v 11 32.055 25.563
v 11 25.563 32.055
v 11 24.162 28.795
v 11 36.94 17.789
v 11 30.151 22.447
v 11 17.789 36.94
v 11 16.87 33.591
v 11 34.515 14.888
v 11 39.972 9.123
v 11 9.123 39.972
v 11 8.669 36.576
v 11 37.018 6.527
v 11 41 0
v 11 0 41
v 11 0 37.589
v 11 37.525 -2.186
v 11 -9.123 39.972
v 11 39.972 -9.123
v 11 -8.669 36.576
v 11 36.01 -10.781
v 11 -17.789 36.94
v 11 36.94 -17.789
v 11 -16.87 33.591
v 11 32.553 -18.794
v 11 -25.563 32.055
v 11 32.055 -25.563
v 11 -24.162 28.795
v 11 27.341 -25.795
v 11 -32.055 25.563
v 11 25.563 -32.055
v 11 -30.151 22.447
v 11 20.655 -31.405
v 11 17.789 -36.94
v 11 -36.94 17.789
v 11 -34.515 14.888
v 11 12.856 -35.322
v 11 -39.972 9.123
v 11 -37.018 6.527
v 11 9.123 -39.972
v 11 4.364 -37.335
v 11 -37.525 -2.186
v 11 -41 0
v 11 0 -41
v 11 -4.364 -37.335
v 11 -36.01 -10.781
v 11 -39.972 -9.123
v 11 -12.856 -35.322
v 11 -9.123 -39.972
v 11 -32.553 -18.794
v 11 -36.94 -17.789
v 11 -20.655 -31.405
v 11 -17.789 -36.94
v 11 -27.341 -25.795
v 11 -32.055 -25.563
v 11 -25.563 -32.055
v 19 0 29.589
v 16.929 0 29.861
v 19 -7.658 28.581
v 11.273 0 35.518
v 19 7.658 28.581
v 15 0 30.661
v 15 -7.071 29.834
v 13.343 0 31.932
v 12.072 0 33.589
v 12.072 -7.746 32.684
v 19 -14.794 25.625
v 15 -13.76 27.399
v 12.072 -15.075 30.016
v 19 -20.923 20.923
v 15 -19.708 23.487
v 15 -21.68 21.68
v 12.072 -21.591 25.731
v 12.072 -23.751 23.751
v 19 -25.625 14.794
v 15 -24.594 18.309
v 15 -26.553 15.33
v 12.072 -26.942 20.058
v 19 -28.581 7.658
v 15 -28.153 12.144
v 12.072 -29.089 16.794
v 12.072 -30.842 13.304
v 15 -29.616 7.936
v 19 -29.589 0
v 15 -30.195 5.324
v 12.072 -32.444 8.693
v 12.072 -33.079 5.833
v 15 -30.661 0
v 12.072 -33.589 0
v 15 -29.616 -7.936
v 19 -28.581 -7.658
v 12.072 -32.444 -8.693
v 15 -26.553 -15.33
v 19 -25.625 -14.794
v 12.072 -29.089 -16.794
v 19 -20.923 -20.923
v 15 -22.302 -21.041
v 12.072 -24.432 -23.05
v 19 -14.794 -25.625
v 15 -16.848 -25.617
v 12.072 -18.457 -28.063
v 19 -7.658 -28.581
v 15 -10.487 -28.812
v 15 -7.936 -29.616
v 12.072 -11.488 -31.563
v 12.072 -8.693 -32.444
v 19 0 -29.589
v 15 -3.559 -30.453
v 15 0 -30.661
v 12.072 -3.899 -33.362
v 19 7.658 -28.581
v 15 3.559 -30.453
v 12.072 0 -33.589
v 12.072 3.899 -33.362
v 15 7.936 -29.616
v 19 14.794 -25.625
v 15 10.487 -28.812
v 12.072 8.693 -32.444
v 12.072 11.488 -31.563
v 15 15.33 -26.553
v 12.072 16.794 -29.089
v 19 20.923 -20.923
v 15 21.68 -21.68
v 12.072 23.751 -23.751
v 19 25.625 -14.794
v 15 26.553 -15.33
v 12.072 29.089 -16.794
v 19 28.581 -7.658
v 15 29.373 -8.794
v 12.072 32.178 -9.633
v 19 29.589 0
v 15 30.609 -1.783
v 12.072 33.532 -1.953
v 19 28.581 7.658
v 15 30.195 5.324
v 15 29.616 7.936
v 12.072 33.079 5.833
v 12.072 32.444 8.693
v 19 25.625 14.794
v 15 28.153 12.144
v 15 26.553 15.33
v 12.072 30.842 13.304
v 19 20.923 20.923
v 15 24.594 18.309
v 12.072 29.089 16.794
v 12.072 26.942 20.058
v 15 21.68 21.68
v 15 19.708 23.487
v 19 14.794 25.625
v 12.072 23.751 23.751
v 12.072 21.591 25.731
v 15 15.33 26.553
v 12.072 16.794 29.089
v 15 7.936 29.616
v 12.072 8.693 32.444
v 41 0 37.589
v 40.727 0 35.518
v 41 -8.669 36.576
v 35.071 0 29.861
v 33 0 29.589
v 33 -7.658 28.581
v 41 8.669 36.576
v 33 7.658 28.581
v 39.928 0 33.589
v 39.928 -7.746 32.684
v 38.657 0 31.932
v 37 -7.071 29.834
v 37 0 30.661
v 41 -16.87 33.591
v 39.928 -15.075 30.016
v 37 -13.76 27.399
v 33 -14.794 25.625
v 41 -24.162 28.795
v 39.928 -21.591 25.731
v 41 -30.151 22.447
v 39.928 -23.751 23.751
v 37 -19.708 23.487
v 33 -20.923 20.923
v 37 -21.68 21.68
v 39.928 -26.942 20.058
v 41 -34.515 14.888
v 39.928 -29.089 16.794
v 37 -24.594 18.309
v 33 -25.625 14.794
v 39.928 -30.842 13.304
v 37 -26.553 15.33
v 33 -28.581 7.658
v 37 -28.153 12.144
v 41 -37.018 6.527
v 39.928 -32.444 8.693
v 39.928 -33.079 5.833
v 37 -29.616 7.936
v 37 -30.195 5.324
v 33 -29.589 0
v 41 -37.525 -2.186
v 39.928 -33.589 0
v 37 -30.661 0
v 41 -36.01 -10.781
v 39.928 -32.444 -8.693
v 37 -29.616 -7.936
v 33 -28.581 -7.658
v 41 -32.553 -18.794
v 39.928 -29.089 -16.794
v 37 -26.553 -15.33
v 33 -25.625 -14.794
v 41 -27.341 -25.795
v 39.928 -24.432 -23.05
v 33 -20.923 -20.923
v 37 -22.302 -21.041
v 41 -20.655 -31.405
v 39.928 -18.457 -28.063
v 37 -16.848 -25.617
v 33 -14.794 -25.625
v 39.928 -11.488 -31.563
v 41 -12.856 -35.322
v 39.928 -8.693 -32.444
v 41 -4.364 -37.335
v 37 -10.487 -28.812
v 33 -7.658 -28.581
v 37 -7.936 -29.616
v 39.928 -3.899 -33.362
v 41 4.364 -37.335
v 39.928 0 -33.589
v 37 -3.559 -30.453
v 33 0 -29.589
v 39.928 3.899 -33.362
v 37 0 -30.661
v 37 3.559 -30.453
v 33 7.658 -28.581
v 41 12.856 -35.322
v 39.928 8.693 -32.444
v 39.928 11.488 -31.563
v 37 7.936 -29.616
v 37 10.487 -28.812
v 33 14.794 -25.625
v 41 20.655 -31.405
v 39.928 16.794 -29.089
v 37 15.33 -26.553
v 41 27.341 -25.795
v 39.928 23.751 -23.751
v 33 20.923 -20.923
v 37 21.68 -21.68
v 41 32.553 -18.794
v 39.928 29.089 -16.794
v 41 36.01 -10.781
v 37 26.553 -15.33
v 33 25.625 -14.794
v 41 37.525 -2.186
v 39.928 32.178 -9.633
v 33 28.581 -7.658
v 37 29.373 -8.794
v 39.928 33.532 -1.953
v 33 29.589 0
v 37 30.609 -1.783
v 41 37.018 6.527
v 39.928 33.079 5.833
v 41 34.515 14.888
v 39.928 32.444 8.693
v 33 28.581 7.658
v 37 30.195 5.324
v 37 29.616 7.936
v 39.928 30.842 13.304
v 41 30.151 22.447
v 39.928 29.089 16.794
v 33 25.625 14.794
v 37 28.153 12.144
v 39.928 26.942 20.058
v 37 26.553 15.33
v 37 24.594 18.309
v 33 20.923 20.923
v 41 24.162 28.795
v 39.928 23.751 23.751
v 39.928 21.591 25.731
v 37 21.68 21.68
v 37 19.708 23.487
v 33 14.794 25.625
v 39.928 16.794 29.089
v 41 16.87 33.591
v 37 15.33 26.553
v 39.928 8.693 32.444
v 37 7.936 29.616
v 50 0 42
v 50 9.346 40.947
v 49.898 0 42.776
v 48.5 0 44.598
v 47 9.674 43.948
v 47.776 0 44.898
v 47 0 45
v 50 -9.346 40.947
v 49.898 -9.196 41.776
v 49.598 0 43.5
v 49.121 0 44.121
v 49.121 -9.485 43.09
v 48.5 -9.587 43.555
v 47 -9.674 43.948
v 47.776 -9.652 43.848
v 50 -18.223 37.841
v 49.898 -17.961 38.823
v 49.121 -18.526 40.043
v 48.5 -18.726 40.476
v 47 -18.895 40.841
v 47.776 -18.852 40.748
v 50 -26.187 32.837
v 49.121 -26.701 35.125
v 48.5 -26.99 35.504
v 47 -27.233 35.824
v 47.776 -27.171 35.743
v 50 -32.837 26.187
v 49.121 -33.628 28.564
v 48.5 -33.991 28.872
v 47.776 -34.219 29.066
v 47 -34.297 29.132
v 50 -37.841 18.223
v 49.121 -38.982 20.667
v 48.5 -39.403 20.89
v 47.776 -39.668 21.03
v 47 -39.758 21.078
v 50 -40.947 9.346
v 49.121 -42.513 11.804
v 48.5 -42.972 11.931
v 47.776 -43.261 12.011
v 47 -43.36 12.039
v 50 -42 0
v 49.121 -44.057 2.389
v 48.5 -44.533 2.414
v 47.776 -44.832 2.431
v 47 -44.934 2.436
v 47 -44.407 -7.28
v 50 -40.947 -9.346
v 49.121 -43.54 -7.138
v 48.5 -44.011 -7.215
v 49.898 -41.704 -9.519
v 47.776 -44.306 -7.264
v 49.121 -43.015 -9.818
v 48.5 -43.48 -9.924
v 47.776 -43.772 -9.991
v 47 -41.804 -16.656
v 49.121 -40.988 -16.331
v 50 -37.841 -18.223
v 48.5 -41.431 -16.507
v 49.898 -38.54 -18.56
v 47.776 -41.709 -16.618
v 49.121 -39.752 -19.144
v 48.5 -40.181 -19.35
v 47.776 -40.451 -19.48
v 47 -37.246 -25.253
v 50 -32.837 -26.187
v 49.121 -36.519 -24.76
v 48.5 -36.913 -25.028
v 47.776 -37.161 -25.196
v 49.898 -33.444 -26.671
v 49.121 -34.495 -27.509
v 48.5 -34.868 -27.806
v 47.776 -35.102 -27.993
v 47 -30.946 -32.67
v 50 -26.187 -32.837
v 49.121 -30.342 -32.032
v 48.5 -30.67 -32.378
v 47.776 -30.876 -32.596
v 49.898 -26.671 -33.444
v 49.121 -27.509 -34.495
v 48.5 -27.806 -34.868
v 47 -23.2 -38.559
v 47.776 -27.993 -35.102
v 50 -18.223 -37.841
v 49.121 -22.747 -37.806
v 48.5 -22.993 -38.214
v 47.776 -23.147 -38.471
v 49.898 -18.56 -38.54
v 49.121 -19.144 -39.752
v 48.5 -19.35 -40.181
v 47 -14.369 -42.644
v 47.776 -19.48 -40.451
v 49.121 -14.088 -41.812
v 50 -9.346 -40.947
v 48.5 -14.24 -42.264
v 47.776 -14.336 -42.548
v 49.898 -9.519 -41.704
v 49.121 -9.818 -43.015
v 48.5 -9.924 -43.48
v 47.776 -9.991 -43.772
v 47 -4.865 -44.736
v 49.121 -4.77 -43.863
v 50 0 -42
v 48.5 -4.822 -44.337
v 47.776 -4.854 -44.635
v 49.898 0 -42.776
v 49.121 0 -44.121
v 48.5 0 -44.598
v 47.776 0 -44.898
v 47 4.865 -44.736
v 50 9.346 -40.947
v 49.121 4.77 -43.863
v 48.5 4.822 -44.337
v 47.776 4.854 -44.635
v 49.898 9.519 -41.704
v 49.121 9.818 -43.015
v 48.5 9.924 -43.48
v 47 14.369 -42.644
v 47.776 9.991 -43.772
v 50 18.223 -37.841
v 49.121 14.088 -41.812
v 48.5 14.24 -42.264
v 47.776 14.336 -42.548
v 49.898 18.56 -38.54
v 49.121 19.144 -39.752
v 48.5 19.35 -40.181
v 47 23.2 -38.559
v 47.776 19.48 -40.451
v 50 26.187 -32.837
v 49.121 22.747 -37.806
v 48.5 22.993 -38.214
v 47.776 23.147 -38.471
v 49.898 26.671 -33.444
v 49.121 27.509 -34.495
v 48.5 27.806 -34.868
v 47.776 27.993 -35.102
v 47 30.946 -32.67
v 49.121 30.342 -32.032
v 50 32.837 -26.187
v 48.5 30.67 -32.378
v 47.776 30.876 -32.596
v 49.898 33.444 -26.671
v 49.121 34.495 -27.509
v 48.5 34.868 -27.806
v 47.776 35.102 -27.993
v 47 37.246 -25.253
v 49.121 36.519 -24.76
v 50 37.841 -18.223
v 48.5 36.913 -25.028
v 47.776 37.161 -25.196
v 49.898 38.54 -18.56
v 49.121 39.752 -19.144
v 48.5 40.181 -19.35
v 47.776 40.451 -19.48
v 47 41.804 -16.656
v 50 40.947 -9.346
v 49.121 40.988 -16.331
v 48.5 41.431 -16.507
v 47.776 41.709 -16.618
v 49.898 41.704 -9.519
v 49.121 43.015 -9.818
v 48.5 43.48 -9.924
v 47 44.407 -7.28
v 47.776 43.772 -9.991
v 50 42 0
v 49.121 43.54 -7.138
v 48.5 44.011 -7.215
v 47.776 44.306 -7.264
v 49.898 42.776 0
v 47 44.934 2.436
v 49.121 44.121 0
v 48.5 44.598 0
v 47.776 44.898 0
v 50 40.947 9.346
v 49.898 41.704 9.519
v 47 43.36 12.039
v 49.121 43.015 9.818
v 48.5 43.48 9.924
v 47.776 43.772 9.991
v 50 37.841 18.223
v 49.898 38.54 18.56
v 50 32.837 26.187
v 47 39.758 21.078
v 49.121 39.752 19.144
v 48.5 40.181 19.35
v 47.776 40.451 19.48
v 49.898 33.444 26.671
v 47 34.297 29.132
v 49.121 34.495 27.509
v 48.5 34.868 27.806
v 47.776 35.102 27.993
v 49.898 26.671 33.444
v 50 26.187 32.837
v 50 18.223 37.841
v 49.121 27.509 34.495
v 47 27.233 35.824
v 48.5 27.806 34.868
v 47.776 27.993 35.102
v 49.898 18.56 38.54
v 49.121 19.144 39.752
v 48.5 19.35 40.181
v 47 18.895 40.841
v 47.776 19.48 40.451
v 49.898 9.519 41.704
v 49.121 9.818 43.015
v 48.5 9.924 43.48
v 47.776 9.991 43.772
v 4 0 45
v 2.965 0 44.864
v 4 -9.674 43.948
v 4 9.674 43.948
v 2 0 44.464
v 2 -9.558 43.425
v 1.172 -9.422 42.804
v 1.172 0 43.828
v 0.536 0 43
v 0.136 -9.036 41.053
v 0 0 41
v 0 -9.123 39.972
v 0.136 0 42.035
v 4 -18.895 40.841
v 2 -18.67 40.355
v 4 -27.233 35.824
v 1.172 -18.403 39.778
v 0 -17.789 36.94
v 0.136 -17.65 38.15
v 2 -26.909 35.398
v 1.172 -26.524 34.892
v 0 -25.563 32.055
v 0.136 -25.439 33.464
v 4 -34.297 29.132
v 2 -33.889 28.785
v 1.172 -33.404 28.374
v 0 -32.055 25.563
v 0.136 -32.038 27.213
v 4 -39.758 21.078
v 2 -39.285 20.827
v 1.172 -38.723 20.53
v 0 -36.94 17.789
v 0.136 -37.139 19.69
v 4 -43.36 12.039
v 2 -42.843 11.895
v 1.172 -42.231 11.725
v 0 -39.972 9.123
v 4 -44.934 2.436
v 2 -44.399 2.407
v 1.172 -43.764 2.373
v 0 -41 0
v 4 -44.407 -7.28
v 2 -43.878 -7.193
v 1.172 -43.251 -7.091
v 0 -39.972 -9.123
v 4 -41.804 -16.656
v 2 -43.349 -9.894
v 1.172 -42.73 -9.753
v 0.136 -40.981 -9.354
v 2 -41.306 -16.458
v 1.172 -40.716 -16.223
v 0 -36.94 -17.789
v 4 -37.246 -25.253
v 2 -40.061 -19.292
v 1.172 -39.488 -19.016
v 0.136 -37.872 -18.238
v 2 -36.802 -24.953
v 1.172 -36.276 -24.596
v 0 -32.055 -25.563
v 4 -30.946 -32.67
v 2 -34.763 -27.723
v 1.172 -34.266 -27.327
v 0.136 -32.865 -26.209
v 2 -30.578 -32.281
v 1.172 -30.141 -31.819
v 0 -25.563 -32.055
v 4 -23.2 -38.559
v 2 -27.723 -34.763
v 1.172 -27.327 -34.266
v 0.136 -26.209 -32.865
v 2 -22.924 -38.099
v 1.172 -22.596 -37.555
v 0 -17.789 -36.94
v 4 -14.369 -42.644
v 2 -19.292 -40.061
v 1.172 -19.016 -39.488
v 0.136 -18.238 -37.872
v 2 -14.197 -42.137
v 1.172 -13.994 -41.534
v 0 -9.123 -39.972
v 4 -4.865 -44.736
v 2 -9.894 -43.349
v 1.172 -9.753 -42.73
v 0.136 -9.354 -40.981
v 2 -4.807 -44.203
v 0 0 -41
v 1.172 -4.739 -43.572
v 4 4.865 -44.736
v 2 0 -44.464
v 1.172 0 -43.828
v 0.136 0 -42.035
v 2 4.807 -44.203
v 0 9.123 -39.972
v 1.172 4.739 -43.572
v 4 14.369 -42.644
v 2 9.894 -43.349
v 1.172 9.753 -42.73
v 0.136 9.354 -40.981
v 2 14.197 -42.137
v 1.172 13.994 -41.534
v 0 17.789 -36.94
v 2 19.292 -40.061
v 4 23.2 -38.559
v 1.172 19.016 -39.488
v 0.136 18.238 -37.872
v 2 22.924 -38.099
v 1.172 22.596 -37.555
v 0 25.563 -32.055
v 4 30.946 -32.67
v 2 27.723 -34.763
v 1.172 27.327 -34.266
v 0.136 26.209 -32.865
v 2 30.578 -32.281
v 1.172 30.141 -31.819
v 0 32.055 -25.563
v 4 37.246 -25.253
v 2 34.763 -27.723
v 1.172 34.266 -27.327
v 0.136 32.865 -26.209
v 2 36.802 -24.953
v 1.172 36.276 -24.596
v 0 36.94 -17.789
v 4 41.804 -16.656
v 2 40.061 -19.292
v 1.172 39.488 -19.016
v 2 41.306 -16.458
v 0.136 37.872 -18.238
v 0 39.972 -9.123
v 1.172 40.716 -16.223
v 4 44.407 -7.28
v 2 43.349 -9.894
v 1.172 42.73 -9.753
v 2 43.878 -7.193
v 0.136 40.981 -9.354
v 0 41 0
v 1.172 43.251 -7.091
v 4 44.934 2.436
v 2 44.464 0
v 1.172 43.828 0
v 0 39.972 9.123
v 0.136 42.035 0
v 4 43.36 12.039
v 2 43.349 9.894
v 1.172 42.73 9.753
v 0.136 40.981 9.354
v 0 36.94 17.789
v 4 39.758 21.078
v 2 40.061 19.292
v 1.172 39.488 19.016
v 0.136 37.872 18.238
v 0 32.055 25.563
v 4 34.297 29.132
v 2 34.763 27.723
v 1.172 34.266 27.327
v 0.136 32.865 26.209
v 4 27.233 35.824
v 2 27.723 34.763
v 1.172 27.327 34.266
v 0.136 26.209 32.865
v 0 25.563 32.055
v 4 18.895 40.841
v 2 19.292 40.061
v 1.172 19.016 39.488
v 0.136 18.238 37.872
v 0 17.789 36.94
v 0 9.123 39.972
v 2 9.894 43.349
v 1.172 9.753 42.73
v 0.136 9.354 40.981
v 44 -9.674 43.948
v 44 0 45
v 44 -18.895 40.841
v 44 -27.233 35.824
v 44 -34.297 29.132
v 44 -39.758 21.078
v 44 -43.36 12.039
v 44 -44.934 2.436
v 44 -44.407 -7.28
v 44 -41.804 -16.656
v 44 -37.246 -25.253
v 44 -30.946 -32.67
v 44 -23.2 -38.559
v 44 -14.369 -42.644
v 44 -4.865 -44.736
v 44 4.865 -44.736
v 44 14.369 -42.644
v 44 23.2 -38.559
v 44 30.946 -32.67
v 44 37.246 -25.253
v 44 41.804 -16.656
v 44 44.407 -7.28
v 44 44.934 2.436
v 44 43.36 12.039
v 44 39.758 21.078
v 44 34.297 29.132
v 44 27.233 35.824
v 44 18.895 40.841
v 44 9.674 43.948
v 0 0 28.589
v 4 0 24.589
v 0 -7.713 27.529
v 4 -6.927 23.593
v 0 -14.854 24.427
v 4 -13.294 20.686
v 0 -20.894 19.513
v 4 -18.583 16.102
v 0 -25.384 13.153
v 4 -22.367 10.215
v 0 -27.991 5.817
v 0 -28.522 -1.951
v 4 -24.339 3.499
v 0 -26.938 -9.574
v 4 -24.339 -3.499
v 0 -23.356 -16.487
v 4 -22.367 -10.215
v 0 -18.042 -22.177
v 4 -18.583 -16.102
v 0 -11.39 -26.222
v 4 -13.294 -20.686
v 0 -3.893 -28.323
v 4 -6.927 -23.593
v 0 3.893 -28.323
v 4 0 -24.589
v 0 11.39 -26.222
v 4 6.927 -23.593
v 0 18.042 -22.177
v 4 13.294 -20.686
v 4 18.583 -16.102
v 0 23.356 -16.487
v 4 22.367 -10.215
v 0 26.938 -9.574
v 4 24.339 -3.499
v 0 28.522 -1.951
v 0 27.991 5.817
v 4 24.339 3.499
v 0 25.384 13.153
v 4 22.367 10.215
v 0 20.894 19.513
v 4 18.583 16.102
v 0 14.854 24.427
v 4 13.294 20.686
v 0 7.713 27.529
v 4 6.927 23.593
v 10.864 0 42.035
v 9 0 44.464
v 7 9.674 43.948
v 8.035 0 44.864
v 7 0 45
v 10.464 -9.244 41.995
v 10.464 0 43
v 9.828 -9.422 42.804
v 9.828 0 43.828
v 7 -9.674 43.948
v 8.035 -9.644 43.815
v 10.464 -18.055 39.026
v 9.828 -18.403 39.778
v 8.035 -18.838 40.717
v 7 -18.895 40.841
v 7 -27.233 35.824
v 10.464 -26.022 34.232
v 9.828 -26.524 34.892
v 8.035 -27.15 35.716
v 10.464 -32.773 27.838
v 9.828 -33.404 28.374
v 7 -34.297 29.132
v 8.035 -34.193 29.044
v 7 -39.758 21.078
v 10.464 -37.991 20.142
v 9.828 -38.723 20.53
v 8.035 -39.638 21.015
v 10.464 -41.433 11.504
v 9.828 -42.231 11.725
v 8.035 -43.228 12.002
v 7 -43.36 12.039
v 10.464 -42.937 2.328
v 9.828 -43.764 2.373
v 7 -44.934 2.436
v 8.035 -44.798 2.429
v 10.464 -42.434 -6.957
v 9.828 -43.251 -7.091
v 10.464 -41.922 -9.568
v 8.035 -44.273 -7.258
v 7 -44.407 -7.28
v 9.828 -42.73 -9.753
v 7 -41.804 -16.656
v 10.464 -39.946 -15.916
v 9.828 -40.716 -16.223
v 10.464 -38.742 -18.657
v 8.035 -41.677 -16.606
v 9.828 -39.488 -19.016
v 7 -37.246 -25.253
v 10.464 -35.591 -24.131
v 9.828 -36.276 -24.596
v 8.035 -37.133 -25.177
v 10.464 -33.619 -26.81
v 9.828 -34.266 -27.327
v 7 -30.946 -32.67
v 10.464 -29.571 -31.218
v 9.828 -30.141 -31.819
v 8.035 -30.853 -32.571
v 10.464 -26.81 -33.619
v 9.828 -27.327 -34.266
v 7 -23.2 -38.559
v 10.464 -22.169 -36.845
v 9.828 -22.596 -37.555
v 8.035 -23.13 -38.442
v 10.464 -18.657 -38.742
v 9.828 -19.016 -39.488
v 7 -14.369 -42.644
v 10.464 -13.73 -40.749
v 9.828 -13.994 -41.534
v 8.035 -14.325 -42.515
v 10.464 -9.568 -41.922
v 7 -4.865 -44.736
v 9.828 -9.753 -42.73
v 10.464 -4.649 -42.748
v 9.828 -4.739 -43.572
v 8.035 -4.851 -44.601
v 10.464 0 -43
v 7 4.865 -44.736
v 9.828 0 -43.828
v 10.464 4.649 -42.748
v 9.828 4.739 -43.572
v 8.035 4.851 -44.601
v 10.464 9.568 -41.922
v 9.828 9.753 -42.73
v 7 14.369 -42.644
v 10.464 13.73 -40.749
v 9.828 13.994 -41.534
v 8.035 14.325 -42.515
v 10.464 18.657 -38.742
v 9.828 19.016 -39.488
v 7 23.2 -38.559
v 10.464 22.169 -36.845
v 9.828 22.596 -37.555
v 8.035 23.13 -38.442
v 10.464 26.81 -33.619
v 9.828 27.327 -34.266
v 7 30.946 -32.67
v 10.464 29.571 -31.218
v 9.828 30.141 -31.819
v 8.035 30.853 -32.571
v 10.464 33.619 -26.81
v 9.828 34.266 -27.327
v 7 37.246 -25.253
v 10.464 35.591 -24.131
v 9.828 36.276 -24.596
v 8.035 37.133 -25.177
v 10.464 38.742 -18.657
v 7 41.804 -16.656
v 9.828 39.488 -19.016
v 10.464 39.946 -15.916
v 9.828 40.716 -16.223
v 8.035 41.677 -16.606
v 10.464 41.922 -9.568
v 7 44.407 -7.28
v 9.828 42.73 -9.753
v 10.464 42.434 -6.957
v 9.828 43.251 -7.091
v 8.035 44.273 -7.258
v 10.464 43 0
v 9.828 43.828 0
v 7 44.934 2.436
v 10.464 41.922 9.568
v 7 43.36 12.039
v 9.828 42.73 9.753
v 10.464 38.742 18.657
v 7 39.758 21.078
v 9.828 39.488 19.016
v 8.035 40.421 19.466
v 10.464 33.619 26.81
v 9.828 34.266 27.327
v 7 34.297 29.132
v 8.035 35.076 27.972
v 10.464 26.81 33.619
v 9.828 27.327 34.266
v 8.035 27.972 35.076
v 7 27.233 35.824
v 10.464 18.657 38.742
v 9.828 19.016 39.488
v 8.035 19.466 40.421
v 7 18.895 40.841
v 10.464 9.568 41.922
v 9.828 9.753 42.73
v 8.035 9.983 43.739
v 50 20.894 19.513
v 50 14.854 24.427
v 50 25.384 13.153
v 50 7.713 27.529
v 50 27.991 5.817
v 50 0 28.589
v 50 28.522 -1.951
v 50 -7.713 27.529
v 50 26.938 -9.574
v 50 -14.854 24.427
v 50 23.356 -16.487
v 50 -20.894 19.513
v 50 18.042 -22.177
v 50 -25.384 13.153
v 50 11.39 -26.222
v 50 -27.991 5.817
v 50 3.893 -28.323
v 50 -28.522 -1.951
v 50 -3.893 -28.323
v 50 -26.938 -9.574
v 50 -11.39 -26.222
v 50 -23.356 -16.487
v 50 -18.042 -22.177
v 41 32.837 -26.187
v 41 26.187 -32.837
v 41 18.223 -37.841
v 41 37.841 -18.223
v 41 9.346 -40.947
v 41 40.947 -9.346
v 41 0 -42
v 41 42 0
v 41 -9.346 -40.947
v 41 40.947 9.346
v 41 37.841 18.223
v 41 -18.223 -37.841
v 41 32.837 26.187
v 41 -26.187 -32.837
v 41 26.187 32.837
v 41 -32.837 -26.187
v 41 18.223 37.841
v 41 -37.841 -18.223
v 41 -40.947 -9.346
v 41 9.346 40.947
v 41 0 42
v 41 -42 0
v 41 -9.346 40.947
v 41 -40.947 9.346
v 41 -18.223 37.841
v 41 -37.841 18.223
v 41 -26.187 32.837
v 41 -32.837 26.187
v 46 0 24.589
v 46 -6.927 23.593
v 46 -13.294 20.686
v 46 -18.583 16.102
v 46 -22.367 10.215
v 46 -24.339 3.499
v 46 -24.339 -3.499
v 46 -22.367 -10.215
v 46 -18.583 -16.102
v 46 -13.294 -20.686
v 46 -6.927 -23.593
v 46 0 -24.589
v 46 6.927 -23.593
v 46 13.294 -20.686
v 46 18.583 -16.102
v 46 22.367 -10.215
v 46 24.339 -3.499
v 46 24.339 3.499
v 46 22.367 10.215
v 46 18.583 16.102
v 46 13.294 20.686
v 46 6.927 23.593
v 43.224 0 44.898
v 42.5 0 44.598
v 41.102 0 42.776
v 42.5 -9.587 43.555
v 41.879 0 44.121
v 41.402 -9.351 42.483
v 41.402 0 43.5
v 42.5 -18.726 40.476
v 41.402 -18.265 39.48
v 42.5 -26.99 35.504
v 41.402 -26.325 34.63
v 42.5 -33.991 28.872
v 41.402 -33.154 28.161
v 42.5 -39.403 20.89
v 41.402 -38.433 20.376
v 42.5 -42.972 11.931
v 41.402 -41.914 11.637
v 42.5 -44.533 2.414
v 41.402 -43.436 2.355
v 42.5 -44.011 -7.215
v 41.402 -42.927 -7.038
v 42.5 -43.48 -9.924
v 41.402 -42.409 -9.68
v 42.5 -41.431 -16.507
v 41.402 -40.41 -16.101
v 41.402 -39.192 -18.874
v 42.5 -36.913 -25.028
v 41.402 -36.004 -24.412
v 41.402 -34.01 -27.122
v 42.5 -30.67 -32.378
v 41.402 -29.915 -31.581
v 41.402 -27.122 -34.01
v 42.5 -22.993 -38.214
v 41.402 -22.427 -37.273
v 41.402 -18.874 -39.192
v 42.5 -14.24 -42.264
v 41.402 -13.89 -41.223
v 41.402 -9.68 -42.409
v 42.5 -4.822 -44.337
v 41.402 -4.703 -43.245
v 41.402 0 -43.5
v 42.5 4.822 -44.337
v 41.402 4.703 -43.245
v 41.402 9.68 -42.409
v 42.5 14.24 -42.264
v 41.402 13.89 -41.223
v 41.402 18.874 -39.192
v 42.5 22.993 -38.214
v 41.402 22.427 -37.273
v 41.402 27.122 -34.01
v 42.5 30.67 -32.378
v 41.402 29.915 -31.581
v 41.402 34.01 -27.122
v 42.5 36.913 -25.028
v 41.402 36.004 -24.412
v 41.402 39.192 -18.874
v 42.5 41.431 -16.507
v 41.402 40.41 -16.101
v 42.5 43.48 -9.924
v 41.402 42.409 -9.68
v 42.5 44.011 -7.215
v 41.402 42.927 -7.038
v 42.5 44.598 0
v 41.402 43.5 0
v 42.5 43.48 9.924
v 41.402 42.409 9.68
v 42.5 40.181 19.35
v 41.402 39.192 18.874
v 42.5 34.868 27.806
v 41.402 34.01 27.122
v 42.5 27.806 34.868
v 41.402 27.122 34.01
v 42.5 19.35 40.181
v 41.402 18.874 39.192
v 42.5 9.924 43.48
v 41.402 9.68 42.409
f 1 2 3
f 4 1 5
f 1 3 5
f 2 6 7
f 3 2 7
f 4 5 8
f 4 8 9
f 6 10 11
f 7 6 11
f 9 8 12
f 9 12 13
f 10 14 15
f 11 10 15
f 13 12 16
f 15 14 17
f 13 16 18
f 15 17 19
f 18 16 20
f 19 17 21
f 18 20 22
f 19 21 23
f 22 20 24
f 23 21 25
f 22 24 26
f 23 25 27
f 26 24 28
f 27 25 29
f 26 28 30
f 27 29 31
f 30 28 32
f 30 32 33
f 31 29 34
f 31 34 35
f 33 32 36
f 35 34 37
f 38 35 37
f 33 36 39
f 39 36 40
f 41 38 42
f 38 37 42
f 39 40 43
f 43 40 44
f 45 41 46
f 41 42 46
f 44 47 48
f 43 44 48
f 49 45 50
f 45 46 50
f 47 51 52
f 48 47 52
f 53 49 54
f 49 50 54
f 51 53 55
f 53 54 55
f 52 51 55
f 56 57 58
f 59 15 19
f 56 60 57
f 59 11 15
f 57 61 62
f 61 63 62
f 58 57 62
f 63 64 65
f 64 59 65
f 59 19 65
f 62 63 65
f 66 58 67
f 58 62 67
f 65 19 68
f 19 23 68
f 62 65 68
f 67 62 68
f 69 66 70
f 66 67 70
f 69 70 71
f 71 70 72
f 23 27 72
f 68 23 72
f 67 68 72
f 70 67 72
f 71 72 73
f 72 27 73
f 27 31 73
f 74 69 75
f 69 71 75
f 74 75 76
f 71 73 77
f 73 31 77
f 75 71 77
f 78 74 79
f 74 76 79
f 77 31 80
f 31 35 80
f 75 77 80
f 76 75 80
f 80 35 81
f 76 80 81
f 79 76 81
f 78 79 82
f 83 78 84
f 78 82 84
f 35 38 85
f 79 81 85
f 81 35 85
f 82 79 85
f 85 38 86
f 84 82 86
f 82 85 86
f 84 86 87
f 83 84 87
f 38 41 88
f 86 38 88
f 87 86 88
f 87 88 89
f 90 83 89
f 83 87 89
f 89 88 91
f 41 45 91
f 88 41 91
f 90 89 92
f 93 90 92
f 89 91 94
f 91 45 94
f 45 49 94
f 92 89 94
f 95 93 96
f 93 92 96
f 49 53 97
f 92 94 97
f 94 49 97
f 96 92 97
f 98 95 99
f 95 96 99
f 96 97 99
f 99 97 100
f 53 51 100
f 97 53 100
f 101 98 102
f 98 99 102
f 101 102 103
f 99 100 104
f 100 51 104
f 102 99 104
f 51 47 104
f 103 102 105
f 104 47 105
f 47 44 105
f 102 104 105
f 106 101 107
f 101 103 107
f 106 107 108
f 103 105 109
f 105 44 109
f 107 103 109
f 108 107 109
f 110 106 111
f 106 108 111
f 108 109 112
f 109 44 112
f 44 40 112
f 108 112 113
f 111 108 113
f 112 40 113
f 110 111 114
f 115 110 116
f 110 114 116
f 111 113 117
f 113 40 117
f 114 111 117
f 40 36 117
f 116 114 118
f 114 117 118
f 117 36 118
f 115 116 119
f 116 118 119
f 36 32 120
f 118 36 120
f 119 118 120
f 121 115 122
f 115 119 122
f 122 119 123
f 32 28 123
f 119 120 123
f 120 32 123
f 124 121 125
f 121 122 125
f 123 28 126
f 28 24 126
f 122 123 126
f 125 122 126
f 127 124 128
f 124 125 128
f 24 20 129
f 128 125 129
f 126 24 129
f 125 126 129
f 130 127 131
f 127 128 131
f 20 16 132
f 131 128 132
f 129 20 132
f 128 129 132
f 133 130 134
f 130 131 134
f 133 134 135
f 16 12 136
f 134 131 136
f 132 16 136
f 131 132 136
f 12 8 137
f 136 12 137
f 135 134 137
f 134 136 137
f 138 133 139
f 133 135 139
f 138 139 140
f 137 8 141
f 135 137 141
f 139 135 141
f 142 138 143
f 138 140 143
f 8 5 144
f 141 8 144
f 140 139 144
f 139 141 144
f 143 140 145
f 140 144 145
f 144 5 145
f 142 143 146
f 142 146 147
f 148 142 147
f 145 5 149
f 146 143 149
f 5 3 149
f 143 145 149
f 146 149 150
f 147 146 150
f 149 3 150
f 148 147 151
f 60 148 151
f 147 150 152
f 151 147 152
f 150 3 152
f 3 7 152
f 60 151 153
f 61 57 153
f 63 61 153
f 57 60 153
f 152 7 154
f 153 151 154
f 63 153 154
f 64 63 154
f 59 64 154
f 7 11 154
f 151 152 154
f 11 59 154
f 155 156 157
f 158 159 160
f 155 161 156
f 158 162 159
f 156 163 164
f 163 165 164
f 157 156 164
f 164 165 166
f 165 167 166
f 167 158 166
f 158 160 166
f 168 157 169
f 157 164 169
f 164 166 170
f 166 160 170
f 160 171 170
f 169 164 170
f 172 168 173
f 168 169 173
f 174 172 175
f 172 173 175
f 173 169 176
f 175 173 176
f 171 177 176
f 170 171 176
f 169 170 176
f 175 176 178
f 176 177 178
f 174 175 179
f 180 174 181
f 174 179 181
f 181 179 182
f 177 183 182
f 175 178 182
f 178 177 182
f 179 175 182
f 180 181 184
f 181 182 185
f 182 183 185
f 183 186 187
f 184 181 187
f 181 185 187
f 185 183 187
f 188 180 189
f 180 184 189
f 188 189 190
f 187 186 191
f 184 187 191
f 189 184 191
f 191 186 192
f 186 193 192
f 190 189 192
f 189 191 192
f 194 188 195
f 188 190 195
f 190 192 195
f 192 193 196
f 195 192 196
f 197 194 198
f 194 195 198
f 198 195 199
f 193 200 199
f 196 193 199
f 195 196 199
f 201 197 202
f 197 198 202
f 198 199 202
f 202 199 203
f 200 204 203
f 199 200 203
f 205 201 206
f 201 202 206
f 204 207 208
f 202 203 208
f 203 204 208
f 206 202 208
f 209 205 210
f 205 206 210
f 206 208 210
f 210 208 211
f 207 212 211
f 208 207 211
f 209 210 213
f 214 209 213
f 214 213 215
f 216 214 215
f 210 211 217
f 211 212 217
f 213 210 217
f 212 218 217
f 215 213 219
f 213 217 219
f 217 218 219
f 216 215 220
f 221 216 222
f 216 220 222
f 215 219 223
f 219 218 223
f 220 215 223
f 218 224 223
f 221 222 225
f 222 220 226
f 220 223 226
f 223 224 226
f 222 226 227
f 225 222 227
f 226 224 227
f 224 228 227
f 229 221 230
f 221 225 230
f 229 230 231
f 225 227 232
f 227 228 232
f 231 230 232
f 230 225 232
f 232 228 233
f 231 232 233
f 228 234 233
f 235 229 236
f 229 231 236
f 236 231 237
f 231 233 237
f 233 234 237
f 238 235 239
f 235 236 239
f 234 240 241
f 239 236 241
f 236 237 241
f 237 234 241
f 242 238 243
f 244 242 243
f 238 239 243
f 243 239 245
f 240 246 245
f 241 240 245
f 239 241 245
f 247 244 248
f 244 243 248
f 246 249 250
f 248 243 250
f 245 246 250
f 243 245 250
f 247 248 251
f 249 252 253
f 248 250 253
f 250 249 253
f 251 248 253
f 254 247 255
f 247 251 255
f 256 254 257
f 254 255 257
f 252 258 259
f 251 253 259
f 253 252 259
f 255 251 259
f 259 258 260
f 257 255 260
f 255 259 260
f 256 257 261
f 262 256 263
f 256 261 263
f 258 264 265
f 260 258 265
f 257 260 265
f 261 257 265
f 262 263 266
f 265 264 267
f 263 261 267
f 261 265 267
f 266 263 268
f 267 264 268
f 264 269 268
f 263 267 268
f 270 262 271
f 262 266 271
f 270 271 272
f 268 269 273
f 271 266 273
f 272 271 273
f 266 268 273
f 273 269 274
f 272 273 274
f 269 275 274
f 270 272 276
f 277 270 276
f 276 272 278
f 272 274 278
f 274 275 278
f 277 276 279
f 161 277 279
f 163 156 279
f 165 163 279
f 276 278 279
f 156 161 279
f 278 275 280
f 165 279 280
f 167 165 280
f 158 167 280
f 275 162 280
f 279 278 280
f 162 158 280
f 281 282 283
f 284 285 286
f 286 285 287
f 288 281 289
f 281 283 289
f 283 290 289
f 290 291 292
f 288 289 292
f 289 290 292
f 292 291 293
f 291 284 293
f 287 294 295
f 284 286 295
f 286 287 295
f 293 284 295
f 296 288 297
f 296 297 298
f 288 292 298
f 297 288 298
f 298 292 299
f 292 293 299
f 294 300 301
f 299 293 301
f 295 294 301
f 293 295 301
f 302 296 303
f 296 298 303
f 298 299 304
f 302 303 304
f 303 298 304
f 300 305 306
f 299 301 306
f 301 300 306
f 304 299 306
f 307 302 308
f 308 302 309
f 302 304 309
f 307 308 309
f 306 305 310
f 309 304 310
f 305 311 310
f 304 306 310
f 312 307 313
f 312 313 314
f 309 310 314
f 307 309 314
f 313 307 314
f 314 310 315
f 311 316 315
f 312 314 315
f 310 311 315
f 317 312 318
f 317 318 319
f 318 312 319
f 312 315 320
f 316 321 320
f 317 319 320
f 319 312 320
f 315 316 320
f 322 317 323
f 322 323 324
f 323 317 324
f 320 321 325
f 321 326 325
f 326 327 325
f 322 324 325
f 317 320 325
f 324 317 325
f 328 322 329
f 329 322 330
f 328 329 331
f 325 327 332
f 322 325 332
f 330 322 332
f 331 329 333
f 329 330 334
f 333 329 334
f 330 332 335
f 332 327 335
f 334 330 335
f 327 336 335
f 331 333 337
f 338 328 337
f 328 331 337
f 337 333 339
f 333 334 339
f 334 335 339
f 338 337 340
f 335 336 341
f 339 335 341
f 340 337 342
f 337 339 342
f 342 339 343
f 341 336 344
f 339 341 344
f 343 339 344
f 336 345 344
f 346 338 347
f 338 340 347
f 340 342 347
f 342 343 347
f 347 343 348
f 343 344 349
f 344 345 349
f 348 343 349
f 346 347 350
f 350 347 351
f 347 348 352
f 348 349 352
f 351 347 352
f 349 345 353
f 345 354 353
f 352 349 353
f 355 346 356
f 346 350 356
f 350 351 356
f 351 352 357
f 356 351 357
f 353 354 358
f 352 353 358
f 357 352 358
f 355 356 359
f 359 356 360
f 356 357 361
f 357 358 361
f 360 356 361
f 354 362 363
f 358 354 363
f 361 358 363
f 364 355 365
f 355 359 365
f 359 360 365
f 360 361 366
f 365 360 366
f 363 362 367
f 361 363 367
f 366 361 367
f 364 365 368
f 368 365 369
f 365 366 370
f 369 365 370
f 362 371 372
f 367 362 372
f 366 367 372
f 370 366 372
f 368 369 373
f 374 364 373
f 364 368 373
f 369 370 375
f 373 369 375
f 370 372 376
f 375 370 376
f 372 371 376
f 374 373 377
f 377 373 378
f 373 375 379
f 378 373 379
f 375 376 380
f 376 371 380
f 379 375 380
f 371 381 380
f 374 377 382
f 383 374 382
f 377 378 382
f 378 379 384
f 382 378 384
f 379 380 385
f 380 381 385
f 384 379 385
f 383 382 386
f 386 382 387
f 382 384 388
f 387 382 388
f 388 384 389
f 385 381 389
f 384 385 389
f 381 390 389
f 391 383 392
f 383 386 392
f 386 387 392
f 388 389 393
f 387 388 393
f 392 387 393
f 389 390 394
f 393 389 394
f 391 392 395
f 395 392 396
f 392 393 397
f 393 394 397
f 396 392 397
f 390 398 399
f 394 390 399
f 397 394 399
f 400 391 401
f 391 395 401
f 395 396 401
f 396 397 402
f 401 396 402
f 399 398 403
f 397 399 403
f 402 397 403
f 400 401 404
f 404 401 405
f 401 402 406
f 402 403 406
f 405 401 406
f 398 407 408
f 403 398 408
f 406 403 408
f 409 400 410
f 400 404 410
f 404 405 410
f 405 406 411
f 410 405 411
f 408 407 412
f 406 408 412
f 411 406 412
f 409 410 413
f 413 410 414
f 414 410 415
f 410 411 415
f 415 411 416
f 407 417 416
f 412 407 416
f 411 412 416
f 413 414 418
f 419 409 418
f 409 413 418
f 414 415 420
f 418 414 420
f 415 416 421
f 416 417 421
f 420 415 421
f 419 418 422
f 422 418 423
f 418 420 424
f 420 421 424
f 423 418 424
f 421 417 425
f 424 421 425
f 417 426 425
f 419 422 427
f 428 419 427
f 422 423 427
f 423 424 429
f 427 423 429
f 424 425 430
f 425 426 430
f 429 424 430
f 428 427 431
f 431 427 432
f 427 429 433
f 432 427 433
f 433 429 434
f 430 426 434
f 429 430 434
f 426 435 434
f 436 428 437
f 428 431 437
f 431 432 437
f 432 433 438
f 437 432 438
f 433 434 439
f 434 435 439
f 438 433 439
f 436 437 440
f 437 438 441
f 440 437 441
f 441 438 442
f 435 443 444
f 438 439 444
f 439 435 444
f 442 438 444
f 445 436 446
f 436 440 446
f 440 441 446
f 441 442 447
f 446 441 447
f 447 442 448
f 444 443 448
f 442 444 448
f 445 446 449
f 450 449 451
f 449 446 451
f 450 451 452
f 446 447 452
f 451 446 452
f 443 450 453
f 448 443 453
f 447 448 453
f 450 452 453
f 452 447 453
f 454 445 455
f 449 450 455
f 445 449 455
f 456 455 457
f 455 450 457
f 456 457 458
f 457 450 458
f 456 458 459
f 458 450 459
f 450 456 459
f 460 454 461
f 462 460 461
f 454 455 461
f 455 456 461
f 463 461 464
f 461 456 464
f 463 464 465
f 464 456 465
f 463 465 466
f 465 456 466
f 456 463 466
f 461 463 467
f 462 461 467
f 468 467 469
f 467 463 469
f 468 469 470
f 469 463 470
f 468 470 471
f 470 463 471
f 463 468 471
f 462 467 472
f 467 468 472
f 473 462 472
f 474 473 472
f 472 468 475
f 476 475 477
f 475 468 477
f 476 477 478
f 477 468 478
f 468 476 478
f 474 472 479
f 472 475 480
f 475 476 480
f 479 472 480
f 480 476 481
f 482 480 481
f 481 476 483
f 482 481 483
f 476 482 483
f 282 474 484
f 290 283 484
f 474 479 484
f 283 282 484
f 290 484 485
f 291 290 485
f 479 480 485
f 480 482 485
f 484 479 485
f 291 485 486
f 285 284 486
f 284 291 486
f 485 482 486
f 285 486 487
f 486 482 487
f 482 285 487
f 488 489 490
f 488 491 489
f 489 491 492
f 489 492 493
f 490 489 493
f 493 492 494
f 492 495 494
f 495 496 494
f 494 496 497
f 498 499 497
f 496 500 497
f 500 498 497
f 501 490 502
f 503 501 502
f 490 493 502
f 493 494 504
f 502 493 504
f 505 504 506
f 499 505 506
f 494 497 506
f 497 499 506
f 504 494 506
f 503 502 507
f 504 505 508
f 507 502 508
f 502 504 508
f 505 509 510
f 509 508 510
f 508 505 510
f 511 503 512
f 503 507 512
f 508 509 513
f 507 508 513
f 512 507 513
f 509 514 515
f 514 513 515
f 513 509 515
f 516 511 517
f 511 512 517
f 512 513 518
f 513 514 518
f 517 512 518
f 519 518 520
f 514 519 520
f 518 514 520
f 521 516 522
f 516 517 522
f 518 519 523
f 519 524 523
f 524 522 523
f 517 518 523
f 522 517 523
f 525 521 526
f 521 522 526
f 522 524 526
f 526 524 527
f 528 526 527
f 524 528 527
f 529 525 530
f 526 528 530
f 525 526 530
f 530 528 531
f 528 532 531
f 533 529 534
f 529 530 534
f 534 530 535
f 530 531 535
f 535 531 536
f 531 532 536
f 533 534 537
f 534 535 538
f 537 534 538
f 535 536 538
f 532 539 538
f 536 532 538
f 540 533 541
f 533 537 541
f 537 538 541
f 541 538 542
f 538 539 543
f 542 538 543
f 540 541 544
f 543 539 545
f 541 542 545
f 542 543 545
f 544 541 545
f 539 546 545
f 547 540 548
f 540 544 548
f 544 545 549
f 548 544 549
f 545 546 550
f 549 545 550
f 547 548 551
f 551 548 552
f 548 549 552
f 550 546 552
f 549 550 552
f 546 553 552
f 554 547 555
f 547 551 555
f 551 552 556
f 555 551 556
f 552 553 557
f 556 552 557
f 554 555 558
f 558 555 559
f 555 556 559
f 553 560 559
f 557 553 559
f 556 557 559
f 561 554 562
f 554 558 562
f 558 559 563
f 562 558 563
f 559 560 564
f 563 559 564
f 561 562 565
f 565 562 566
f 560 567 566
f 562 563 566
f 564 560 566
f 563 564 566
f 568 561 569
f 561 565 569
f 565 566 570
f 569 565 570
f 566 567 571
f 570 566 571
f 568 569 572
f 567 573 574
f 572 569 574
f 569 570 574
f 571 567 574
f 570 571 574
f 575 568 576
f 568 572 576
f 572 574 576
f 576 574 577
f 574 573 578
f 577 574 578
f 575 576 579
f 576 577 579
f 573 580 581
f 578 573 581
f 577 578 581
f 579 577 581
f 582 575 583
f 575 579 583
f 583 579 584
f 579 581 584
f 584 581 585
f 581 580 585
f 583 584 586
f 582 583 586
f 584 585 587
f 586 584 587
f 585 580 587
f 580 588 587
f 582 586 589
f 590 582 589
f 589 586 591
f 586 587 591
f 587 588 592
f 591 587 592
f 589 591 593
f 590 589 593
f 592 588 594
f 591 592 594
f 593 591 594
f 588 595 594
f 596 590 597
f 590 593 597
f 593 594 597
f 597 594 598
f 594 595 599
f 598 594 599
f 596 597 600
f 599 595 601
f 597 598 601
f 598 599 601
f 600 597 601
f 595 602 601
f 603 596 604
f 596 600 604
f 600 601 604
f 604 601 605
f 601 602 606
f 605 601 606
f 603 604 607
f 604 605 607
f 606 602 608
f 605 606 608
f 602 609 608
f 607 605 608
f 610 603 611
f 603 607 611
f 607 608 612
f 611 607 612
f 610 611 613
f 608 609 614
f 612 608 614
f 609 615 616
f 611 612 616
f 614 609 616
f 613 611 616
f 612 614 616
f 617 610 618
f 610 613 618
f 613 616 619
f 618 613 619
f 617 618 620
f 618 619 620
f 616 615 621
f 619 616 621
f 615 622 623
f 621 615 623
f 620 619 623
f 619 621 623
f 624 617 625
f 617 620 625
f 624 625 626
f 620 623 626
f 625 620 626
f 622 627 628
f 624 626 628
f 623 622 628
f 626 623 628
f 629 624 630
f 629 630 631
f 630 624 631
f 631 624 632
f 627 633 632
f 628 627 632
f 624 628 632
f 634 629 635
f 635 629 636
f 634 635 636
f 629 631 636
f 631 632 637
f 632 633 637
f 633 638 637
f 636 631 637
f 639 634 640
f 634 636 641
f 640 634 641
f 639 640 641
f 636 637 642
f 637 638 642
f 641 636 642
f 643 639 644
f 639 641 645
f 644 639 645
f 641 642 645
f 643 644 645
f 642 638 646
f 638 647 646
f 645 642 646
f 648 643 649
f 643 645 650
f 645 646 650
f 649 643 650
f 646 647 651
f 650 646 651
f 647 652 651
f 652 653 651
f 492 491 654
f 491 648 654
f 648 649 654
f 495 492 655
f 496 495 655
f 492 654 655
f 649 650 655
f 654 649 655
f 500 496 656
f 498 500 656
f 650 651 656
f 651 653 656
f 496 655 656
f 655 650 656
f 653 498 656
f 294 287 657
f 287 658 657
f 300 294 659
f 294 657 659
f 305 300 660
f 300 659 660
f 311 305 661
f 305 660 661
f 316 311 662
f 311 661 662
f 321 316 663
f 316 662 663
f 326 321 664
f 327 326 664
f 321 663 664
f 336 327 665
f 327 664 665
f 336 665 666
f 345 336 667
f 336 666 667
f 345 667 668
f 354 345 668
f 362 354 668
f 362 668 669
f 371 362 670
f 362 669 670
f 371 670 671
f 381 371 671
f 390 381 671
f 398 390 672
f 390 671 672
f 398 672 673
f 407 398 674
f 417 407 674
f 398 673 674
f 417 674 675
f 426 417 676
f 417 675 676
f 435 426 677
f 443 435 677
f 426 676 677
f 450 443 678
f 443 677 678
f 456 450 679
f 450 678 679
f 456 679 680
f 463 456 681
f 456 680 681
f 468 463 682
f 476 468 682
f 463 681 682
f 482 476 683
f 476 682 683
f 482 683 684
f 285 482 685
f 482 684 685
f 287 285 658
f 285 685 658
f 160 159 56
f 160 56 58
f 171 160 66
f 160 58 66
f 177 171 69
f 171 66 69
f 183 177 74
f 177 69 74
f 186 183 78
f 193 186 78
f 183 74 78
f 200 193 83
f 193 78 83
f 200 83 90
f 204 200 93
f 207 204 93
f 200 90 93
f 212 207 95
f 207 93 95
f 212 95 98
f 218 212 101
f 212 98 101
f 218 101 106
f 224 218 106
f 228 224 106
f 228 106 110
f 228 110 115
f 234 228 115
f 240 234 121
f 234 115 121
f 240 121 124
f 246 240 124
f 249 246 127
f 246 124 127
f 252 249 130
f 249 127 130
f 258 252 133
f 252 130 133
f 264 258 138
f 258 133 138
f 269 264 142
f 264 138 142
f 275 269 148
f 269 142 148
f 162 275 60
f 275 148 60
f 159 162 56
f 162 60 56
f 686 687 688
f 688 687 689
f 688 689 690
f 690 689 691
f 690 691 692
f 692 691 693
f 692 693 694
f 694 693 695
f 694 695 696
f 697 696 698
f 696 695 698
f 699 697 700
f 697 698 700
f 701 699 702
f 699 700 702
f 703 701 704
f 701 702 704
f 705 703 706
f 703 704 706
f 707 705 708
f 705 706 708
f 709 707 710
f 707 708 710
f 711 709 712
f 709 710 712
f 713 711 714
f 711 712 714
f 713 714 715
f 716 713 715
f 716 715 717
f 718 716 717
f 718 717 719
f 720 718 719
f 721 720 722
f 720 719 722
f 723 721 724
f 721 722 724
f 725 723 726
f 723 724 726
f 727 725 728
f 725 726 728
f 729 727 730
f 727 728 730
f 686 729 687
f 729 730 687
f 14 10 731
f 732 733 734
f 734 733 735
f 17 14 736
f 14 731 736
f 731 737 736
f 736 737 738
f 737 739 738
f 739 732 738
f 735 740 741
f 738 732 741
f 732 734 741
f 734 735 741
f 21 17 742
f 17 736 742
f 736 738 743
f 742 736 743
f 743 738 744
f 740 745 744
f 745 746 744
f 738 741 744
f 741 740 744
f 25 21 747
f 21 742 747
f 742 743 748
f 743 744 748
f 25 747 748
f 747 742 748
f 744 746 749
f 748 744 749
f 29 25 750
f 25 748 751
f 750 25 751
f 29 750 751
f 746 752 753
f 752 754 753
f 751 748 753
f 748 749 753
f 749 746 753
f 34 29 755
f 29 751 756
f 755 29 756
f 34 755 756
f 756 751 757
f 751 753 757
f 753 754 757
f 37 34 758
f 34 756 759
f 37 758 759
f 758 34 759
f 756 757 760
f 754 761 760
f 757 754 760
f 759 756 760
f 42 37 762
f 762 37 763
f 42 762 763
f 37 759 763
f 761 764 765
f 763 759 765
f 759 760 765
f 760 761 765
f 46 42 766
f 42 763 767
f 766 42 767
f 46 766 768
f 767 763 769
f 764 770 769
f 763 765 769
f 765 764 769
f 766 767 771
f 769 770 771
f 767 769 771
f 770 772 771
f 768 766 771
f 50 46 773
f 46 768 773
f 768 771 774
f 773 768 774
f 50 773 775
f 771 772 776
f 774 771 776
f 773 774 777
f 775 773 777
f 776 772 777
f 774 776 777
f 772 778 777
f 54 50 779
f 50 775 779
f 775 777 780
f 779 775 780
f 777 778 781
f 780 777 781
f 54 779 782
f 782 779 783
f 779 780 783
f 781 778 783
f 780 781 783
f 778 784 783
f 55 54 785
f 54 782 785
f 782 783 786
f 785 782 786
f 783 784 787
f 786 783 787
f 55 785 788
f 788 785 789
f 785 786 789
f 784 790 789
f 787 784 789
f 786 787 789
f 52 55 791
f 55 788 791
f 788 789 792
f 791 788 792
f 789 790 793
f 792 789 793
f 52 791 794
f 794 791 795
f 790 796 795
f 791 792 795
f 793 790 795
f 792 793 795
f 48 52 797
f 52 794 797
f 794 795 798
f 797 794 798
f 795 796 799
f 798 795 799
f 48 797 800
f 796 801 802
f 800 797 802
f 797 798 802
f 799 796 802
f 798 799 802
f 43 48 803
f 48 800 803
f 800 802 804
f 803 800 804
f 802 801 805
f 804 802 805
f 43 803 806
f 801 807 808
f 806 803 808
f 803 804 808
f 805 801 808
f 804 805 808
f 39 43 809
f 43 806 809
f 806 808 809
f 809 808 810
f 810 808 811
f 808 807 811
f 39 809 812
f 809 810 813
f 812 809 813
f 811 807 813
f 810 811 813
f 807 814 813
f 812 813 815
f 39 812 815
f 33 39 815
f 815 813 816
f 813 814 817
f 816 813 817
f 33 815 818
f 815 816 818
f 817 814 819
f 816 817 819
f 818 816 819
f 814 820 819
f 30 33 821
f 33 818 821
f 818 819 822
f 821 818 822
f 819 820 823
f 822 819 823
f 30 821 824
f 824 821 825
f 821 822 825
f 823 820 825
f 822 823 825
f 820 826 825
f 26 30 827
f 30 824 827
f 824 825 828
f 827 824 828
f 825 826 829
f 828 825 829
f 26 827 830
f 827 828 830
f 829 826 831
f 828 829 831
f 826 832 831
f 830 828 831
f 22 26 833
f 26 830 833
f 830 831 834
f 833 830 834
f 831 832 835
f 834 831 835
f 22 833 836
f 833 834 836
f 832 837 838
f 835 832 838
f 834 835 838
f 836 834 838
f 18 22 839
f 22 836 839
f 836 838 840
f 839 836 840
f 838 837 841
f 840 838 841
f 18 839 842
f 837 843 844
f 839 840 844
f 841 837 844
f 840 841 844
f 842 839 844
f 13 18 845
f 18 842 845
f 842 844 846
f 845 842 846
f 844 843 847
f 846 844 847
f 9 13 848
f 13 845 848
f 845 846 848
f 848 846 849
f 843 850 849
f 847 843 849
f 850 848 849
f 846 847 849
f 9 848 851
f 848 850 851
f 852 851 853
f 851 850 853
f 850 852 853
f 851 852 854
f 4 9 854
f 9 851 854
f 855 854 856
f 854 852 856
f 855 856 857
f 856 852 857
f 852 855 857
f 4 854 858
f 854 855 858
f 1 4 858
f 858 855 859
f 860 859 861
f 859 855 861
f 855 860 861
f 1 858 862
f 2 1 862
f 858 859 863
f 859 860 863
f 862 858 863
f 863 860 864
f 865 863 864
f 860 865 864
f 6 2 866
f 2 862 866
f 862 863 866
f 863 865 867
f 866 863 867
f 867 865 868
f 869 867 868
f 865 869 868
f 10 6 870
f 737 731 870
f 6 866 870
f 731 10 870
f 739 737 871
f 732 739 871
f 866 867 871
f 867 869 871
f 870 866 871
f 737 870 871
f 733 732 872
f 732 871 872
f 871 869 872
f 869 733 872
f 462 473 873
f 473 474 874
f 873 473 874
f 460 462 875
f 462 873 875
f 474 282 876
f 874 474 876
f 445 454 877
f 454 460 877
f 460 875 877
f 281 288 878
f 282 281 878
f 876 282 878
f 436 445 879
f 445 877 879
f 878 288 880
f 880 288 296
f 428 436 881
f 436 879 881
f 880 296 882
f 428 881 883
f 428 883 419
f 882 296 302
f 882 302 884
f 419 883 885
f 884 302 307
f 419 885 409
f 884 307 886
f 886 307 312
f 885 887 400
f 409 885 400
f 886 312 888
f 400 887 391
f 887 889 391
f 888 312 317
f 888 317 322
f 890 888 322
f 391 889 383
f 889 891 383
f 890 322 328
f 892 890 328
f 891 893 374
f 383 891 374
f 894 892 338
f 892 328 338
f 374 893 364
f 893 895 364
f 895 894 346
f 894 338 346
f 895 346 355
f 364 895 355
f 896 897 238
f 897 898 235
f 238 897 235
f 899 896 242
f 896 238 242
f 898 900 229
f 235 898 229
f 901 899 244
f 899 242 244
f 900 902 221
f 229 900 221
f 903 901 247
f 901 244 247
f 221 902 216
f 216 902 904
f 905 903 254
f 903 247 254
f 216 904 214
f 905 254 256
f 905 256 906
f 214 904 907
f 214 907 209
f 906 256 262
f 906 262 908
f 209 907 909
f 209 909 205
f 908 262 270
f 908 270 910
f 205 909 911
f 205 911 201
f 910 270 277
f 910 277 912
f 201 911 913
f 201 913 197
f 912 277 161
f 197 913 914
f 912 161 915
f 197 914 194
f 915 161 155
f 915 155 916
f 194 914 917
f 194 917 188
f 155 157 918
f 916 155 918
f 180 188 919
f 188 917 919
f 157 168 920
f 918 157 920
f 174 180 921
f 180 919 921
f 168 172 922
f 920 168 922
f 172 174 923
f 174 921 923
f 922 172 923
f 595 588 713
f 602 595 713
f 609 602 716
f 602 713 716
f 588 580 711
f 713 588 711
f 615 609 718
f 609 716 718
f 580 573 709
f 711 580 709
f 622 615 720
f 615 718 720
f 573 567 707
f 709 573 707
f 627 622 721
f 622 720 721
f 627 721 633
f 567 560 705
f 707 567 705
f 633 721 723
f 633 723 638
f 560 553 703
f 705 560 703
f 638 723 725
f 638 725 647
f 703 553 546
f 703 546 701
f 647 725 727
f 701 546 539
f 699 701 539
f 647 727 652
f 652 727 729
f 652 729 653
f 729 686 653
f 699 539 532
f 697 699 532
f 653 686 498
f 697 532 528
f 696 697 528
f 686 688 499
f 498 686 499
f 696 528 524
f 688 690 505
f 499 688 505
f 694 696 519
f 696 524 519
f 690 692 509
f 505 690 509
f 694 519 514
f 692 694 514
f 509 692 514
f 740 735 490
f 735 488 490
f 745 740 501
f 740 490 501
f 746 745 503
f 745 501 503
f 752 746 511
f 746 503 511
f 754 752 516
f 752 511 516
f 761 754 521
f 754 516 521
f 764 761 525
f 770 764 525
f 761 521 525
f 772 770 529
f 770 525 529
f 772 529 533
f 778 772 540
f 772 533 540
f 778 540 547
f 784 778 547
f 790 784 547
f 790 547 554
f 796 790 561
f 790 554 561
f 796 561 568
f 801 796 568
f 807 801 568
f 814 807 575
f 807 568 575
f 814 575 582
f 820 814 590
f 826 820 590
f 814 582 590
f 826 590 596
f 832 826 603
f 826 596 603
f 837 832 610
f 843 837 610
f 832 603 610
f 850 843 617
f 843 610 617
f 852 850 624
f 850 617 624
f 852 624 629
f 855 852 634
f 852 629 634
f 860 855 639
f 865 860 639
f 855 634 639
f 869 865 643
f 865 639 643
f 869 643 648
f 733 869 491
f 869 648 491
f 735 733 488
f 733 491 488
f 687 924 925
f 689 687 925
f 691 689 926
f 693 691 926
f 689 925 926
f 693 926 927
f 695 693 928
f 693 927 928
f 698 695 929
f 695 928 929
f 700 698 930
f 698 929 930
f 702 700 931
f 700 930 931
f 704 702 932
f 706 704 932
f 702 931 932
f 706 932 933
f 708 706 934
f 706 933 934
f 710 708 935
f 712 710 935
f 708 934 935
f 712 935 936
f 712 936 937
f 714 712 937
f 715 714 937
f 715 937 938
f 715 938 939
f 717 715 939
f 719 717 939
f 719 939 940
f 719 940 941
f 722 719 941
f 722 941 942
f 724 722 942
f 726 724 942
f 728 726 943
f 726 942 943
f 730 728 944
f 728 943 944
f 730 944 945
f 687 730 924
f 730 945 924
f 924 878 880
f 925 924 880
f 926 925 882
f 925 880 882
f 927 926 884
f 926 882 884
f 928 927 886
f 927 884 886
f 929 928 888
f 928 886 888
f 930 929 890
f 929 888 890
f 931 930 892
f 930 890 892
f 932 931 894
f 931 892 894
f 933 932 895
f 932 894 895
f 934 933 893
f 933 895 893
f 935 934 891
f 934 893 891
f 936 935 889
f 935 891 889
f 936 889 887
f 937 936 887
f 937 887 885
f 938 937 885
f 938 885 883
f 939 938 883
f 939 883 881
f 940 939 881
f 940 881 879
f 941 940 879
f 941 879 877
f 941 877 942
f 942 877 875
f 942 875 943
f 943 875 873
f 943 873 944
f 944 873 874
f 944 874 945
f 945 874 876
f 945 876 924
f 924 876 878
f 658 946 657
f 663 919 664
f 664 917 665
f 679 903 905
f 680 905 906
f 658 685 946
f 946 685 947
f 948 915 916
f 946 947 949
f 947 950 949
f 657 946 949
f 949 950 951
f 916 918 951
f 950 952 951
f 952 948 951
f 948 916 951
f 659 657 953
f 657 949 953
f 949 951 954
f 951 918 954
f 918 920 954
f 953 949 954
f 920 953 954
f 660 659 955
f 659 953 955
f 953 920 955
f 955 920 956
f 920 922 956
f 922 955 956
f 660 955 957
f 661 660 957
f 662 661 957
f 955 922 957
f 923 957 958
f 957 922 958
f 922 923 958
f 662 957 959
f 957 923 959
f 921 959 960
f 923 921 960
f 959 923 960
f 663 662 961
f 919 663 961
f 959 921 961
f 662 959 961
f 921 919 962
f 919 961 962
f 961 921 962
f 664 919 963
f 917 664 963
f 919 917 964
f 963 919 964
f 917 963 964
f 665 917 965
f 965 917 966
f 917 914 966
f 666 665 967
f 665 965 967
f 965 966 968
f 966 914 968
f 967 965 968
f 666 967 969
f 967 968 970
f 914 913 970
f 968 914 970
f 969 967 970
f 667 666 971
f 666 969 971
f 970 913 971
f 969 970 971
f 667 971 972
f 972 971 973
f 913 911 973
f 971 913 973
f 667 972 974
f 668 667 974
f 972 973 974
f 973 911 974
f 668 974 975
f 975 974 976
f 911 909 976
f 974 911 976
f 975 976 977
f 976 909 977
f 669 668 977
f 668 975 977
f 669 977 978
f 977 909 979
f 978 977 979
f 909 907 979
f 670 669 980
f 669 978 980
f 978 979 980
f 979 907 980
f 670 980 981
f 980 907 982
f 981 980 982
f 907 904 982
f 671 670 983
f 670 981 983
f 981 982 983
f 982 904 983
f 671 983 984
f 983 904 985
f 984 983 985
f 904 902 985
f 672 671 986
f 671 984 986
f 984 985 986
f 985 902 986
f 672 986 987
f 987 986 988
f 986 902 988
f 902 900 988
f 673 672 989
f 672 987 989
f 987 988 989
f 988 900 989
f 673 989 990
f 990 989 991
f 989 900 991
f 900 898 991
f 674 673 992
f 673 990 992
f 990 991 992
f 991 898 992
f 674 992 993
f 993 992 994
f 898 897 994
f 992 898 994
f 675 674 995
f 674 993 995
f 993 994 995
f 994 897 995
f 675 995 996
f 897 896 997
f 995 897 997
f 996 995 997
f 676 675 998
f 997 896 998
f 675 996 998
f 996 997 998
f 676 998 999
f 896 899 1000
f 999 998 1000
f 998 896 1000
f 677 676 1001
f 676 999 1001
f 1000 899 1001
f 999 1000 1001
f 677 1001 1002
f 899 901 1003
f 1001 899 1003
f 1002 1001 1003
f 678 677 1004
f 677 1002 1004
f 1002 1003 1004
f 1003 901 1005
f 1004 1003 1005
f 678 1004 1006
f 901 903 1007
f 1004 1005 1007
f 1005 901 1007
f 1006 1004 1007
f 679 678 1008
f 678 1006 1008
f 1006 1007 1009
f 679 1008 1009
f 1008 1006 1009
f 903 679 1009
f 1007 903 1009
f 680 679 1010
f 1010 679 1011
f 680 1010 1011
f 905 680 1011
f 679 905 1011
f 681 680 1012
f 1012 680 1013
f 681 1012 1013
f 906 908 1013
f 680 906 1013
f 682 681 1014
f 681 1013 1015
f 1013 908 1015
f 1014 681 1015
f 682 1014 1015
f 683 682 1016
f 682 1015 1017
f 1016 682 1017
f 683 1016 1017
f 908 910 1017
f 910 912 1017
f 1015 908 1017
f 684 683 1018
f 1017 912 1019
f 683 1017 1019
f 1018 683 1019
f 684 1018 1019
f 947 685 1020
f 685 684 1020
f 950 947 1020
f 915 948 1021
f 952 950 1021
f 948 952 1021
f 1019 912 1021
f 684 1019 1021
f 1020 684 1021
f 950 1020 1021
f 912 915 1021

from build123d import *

# Parameters (mm, degrees)
F2_SIZE = 4


with BuildPart() as f1:
    # F0 (on Front) → F1 (revolve)
    with BuildSketch(Plane.XZ):
        with BuildLine():
            ThreePointArc((4, 45), (1.171573, 43.828427), (0, 41))
            Line((0, 41), (0, 24.588905))
            Line((0, 24.588905), (50, 24.588905))
            Line((50, 24.588905), (50, 42))
            ThreePointArc((50, 42), (49.12132, 44.12132), (47, 45))
            Line((47, 45), (44, 45))
            ThreePointArc((44, 45), (41.87868, 44.12132), (41, 42))
            Line((41, 42), (41, 37.588905))
            ThreePointArc((41, 37.588905), (38.656854, 31.932051), (33, 29.588905))
            Line((33, 29.588905), (19, 29.588905))
            ThreePointArc((19, 29.588905), (13.343146, 31.932051), (11, 37.588905))
            Line((11, 37.588905), (11, 41))
            ThreePointArc((11, 41), (9.828427, 43.828427), (7, 45))
            Line((7, 45), (4, 45))
        make_face()
    revolve(axis=Axis((38.676817, 0, 0), (1, 0, 0)))

    # F2
    f2_edges = [f1.edges().sort_by_distance(p)[0] for p in [
        (0, 0, -24.588905),
        (50, 0, -24.588905),
        (25, 0, 24.588905),
    ]]
    chamfer(f2_edges, length=F2_SIZE)


solid = f1.part
